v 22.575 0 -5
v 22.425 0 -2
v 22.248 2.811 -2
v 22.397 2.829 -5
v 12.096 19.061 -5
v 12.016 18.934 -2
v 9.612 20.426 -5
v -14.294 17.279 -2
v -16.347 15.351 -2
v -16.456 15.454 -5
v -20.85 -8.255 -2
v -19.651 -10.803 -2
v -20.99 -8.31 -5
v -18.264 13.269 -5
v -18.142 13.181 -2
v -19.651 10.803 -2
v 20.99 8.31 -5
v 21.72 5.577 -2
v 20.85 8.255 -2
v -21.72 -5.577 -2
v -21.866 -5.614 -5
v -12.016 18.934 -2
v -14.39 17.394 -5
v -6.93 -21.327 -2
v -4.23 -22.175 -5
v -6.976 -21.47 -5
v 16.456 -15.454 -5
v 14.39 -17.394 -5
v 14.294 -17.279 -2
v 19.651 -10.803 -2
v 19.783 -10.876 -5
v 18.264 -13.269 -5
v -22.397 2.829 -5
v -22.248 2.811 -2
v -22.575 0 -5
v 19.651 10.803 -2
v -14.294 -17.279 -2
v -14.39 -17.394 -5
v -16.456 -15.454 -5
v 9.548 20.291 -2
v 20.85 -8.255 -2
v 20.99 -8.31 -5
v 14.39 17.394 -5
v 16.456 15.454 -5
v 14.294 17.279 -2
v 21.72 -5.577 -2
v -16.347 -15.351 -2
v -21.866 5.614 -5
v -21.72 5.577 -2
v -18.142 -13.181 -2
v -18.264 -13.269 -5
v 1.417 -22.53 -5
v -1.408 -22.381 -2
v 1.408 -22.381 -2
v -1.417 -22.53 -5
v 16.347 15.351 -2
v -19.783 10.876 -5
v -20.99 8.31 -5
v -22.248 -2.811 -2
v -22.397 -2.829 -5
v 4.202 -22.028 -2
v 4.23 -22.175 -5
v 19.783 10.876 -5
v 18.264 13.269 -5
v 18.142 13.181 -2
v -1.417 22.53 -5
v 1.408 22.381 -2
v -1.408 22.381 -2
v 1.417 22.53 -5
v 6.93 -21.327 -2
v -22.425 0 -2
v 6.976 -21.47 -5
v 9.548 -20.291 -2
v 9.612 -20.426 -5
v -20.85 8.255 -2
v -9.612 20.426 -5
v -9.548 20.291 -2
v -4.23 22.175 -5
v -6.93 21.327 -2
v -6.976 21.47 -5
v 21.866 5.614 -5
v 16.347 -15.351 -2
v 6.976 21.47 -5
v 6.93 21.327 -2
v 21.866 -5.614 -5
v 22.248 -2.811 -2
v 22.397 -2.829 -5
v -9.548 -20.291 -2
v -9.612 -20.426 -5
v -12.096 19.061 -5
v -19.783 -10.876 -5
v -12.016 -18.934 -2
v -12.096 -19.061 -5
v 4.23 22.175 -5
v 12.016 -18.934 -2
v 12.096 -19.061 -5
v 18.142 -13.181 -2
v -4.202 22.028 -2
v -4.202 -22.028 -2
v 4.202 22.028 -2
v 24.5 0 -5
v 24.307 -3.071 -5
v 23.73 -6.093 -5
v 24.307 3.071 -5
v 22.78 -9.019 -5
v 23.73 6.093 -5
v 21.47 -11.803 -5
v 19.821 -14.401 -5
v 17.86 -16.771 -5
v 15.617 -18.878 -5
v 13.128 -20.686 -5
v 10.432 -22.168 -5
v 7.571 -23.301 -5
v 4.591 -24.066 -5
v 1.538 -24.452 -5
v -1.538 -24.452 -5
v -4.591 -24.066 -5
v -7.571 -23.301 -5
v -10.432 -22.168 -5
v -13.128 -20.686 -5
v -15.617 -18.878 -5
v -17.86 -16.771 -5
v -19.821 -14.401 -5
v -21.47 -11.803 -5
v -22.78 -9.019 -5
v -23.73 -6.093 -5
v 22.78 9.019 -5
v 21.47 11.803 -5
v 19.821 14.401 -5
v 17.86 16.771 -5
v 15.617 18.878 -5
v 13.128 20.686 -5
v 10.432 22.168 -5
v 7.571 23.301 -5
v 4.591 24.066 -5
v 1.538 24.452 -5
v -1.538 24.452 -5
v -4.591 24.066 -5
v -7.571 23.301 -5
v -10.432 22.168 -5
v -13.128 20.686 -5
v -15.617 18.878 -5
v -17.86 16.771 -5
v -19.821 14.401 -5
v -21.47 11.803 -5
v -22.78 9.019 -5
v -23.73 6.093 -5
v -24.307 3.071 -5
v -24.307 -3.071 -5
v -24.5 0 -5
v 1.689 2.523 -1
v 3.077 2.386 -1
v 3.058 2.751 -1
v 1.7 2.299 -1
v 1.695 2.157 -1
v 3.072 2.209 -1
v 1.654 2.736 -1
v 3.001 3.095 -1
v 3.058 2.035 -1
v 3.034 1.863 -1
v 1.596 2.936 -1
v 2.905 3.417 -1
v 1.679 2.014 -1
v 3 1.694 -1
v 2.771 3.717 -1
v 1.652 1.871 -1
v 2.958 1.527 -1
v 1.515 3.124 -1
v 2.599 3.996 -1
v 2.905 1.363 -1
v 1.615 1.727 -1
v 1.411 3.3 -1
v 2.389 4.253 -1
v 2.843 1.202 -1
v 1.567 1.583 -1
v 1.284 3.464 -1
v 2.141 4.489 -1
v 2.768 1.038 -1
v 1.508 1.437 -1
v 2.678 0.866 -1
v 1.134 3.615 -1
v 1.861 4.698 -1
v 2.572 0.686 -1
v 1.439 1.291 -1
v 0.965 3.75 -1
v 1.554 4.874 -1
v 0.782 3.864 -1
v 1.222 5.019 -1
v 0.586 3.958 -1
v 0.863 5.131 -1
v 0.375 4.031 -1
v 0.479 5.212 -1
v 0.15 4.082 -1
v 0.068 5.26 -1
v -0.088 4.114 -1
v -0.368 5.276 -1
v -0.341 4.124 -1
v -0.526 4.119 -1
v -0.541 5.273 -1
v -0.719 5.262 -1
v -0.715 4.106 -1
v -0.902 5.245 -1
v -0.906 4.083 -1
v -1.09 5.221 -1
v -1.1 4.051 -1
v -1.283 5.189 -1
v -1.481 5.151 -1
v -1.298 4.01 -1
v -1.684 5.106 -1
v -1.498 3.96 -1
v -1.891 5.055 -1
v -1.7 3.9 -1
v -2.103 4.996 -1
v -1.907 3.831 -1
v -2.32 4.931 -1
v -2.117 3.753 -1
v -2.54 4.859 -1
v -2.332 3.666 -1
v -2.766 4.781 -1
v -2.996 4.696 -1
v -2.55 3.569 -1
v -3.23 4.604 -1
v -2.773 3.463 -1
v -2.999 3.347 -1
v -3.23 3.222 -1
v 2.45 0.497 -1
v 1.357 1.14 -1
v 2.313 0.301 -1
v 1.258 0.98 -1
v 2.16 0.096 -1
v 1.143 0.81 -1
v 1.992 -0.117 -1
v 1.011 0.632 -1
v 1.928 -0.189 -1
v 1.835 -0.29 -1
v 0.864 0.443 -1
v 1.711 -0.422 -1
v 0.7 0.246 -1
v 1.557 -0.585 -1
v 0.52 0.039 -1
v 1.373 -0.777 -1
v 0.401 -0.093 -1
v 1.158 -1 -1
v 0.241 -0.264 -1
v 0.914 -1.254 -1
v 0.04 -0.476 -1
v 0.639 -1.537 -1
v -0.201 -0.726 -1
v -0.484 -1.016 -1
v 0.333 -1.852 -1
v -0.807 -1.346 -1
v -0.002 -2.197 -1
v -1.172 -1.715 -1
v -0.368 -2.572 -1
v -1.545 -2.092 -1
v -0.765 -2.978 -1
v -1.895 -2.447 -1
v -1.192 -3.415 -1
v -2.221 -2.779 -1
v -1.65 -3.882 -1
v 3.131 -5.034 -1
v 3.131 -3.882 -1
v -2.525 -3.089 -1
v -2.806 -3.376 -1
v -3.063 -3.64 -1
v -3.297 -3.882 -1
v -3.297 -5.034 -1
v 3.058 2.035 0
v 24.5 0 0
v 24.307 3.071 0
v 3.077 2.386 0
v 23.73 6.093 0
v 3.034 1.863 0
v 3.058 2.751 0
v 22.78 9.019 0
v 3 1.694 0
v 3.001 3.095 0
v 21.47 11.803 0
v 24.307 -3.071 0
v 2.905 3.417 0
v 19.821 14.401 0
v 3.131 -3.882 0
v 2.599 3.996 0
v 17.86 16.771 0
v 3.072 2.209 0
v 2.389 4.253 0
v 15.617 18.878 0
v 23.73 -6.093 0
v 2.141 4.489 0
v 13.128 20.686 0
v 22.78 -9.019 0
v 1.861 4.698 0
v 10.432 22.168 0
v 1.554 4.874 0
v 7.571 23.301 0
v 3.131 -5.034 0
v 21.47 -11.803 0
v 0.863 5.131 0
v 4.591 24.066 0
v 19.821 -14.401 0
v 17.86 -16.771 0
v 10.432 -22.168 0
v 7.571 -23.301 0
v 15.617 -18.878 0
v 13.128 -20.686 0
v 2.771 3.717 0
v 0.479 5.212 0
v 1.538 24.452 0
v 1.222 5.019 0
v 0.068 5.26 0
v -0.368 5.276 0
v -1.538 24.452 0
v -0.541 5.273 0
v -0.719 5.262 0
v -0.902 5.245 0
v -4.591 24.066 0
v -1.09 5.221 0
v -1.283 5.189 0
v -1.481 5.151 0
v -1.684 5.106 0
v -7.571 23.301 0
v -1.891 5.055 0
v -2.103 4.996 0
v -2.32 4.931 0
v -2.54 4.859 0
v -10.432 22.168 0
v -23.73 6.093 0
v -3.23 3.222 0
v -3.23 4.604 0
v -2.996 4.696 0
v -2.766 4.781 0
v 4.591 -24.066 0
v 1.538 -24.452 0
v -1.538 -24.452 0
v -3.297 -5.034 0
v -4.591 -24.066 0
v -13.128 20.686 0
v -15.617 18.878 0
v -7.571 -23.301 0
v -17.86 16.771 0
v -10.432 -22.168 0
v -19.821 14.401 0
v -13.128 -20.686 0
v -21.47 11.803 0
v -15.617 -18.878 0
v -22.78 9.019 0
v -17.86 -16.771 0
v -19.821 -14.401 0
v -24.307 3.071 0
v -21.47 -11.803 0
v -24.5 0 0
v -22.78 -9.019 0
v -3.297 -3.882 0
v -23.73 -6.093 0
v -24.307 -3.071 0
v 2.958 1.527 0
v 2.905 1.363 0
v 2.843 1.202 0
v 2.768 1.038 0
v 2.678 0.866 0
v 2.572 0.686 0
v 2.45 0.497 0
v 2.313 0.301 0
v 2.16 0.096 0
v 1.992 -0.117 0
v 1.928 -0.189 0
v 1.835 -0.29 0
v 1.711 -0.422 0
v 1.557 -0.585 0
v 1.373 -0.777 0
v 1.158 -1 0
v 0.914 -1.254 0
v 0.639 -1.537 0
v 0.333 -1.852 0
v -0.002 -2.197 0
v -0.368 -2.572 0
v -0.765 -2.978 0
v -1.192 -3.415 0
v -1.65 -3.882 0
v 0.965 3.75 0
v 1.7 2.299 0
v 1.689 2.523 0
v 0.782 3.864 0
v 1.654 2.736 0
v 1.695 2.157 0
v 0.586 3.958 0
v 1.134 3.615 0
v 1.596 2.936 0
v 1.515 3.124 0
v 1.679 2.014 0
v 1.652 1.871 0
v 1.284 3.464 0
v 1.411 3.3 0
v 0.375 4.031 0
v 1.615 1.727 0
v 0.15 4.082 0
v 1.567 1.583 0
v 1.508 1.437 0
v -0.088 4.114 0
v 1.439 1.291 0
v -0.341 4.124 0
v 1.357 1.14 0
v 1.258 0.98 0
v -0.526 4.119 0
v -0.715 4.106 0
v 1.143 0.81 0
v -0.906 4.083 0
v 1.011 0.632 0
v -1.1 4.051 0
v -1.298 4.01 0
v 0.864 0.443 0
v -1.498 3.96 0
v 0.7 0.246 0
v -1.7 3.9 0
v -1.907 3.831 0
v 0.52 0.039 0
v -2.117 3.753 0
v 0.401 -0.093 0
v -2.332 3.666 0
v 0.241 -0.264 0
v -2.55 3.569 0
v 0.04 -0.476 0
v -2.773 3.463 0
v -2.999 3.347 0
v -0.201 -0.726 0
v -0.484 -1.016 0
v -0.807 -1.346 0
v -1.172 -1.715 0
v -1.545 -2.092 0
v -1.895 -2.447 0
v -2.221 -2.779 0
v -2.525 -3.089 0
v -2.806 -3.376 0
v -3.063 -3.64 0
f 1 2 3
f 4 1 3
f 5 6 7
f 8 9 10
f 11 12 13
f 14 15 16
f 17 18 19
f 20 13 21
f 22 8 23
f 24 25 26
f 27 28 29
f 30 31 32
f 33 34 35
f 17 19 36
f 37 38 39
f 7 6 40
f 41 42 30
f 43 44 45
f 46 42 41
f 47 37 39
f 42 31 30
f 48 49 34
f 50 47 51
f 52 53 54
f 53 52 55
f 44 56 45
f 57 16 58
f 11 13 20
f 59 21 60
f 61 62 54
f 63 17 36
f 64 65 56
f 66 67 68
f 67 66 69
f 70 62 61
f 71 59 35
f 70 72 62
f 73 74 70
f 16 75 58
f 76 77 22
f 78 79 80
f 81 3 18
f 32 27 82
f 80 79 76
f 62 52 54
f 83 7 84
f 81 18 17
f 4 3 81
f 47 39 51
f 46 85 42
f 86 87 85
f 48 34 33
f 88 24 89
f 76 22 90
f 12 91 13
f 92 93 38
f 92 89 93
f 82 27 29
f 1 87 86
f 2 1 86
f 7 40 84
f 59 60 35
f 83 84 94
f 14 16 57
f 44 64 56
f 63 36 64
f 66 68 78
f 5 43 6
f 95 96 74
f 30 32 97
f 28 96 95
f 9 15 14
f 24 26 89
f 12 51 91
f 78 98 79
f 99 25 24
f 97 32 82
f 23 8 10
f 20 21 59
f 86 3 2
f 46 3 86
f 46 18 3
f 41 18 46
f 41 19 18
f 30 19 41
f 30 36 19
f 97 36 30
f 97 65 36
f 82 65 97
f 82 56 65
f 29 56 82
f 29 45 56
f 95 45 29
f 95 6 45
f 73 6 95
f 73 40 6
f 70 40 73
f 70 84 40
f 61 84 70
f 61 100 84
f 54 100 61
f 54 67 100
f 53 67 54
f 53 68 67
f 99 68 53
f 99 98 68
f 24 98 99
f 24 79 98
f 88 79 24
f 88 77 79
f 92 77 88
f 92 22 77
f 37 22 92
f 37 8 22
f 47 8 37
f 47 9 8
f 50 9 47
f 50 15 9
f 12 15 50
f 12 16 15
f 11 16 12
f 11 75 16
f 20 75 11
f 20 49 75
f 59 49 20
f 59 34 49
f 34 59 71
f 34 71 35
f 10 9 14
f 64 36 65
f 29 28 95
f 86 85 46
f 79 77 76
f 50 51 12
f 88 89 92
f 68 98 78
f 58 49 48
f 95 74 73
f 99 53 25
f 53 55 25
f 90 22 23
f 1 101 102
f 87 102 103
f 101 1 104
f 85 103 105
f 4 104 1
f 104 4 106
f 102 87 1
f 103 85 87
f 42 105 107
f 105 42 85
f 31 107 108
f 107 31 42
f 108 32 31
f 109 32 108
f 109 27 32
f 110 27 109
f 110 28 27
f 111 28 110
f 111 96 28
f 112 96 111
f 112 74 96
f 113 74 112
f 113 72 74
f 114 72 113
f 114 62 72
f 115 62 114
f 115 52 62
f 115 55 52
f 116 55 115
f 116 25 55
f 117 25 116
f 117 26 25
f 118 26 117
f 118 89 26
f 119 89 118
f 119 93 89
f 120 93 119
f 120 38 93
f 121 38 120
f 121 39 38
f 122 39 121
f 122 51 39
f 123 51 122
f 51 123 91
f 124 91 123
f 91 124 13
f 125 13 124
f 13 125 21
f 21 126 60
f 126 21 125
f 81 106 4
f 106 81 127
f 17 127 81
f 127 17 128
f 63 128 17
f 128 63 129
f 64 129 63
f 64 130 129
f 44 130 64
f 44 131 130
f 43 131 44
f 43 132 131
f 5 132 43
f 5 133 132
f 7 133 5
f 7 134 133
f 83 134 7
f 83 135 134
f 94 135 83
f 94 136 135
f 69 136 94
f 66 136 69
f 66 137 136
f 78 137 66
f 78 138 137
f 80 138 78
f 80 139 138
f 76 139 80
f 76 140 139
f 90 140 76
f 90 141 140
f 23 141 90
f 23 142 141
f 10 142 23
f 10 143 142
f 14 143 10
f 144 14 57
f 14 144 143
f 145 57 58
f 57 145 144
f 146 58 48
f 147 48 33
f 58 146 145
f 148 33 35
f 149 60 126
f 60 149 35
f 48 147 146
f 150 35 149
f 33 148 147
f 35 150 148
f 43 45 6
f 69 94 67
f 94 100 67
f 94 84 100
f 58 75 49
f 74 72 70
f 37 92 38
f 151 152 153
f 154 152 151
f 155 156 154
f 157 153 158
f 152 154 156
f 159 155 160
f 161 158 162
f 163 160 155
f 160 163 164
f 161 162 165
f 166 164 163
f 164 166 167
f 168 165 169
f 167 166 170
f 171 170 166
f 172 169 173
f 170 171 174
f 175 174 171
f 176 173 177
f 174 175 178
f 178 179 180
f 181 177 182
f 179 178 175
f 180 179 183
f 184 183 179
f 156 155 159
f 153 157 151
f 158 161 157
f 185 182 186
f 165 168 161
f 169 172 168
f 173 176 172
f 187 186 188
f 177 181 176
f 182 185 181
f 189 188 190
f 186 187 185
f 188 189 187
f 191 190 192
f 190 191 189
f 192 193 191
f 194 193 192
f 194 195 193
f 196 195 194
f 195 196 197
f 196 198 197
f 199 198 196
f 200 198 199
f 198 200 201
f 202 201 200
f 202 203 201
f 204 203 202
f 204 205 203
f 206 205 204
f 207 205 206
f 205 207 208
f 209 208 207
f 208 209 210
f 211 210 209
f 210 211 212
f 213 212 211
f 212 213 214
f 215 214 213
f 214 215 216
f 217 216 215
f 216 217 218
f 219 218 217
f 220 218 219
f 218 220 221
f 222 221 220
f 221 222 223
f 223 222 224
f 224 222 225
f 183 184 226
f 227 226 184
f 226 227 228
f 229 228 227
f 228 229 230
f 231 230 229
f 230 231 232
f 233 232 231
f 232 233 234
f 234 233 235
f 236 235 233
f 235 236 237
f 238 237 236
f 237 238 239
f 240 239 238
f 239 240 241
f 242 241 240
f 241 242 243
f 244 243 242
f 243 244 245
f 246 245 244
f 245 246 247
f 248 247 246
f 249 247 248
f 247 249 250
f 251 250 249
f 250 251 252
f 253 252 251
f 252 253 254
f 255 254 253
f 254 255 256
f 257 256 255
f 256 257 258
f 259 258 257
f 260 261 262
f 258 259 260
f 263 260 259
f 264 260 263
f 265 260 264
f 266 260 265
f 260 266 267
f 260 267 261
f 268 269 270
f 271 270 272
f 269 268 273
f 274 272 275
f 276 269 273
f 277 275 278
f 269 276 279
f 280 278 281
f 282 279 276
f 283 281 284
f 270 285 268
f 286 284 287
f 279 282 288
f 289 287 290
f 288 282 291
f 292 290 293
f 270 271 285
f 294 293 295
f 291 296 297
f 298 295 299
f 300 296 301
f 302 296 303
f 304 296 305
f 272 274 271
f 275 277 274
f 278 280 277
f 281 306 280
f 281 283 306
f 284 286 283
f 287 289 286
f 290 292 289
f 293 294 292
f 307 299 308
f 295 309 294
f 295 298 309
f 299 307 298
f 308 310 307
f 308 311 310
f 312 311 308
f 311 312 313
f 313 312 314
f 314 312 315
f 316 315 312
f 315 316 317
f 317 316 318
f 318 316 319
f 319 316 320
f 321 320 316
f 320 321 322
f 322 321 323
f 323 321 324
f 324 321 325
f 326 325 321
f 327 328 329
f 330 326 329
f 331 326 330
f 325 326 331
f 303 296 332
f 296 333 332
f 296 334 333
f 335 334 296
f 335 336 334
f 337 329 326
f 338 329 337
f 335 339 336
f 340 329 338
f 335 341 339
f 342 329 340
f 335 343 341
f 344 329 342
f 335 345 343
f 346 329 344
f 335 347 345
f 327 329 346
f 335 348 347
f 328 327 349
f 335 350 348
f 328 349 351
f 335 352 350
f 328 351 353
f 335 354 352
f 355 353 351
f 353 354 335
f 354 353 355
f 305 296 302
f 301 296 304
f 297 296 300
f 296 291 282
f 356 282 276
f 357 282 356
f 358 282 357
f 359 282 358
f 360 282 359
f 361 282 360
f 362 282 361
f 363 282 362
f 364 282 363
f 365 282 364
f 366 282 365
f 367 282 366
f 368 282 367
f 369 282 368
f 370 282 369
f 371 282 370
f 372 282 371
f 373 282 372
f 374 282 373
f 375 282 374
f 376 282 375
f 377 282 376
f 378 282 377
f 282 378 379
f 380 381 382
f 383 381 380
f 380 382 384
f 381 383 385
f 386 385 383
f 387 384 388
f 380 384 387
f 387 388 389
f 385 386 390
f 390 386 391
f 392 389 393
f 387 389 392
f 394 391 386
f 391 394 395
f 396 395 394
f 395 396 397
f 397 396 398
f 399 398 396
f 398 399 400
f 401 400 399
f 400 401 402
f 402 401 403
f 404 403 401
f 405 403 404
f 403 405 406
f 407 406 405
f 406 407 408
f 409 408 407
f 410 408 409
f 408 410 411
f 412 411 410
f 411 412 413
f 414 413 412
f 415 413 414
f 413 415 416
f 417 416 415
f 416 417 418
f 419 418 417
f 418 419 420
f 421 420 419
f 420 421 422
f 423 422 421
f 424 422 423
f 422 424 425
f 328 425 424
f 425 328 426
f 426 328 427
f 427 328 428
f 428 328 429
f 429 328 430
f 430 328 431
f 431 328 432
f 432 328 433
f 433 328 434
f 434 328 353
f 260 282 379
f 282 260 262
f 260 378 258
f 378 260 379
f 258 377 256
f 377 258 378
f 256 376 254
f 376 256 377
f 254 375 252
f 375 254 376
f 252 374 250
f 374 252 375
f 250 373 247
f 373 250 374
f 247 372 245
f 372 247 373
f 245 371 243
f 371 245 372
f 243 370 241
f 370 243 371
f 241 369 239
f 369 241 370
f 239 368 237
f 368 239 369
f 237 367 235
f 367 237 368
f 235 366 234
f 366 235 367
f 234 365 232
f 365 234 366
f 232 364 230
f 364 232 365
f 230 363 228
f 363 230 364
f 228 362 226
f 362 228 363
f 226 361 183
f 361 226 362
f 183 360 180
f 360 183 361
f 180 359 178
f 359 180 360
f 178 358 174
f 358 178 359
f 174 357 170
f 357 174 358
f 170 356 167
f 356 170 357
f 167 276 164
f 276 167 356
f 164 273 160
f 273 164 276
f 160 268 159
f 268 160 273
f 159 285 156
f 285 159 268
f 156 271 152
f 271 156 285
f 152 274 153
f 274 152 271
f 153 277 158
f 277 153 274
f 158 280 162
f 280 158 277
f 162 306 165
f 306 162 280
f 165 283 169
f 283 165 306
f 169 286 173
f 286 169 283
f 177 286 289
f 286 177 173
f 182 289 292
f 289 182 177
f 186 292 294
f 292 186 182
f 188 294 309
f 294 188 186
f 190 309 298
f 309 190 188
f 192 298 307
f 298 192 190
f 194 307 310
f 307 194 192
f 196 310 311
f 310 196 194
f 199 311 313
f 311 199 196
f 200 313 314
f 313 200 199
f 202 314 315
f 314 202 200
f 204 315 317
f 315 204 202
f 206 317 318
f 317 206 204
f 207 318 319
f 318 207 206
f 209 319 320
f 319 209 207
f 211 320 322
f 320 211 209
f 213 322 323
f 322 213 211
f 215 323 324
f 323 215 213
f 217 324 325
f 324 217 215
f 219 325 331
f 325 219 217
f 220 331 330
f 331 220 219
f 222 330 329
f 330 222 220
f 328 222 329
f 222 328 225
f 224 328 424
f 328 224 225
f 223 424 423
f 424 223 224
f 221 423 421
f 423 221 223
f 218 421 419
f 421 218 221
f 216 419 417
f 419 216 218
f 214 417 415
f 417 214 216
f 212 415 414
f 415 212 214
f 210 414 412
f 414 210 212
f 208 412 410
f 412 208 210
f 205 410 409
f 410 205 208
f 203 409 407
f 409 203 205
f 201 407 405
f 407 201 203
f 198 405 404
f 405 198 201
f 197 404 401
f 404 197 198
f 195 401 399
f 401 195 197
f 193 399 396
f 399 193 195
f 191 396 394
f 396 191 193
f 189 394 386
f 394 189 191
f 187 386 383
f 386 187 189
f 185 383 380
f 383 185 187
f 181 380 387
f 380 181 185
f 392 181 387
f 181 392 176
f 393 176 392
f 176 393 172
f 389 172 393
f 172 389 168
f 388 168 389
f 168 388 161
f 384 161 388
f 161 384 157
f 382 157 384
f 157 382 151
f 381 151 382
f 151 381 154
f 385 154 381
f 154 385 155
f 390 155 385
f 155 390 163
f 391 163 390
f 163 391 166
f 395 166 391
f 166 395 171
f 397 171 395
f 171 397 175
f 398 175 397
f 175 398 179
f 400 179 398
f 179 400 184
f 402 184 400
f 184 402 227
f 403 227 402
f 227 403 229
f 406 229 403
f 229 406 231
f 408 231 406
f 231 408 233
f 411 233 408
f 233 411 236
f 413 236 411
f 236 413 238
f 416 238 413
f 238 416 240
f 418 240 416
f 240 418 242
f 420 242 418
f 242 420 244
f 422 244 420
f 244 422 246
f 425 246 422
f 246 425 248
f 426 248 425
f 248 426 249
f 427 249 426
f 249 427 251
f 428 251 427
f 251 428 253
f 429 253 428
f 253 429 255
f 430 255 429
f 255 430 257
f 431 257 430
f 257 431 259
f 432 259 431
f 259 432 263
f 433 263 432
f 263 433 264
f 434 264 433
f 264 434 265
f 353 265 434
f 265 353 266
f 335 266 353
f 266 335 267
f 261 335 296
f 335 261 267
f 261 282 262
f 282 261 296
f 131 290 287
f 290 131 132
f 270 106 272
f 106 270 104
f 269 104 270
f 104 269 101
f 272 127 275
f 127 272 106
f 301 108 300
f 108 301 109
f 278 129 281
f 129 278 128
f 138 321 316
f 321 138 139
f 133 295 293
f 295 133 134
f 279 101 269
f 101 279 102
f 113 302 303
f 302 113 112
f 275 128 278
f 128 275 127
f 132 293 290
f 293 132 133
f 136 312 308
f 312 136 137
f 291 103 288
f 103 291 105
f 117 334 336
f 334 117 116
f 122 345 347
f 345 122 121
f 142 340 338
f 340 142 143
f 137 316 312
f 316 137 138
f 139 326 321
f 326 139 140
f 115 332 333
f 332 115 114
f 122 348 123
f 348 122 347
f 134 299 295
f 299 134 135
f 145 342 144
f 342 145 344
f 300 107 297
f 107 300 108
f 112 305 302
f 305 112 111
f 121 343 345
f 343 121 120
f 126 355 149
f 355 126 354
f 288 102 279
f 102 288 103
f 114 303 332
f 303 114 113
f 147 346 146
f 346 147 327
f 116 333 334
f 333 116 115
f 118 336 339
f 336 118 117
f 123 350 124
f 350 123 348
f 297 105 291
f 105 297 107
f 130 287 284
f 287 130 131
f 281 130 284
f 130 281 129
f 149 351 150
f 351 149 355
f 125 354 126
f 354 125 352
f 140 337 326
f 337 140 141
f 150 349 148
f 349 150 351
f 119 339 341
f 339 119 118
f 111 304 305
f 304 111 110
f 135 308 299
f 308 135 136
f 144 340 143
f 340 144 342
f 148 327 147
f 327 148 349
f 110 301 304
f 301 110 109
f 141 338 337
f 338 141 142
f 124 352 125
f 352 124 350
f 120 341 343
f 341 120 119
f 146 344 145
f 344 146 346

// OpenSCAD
$fn = 50;

difference() {
	union() {
		translate(v = [0, 0, -5.0]) {
			cylinder(h = 5, r = 24.5);
		}
	}
	union() {
		#translate(v = [0, 0, -5.0]) {
			cylinder(h = 3, r1 = 22.575, r2 = 22.425);
		}
		translate(v = [0, 0, -1]) {
			linear_extrude(height = 1) {
				text(font = "Impact", halign = "center", size = 10, text = "2", valign = "center");
			}
		}
	}
}
